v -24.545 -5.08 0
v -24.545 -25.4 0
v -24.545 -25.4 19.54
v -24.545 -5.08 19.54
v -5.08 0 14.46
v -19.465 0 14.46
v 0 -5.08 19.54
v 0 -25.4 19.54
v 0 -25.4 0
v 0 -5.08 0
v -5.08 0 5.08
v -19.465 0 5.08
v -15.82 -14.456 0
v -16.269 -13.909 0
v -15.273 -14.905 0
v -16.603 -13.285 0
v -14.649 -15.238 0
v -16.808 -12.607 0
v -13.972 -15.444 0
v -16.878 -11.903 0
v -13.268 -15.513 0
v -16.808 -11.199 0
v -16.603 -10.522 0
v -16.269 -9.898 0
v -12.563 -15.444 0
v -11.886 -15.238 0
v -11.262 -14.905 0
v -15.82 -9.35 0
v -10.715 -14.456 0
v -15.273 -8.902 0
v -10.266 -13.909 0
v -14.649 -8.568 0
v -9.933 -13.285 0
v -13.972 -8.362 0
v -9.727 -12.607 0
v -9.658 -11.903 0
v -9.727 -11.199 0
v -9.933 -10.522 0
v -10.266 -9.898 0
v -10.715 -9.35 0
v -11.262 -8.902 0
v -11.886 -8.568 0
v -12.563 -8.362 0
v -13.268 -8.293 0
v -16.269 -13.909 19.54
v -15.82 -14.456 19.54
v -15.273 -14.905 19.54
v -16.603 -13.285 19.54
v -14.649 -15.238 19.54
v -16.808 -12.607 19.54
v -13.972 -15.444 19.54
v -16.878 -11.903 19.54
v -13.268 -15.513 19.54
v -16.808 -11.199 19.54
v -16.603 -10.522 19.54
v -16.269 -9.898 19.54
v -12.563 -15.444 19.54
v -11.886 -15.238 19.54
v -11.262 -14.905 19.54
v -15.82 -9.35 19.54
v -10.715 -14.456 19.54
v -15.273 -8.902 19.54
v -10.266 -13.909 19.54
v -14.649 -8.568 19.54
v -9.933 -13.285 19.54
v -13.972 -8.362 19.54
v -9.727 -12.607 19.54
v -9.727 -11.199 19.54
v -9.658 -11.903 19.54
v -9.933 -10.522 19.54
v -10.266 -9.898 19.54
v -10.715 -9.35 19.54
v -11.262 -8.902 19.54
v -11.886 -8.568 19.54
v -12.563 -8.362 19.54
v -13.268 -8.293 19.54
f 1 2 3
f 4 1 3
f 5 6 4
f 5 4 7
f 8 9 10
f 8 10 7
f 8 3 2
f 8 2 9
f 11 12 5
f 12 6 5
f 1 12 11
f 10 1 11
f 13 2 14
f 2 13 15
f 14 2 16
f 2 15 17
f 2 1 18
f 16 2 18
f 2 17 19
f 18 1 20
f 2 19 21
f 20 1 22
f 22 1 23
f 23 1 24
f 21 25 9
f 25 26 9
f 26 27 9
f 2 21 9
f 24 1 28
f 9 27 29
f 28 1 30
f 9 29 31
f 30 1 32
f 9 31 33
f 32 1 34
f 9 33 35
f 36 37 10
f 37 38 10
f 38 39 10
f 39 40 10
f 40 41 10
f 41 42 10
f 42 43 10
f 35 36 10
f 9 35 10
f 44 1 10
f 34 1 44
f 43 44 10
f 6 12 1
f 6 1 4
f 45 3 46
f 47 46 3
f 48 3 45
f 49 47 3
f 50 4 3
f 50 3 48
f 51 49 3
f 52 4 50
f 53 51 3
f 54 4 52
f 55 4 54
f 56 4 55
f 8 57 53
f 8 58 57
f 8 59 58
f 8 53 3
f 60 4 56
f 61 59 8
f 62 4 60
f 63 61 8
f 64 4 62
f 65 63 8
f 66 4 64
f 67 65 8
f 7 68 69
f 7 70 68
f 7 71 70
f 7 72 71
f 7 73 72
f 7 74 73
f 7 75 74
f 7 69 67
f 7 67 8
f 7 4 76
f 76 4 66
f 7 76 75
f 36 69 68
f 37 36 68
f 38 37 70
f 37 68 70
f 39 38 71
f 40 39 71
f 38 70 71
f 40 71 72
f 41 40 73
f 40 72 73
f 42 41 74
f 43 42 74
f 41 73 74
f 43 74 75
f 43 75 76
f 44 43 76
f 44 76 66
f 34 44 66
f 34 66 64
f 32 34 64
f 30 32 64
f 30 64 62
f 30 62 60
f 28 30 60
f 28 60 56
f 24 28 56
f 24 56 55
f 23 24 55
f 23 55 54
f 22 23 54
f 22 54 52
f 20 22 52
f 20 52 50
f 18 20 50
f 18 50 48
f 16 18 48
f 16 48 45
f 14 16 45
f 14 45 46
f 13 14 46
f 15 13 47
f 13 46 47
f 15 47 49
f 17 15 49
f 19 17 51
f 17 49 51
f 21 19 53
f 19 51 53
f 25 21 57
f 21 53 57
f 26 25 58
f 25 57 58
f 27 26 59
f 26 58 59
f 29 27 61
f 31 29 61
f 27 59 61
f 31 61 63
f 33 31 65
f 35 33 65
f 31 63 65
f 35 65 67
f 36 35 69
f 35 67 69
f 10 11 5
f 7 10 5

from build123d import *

# Parameters (mm, degrees)
F0_W     = 24.5453510433
F0_H     = 19.5398386568
F1_DEPTH = 25.4
F2_SIZE  = 5.08
F3_R     = 3.6099939591
F4_DEPTH = 19.5408386568


with BuildPart() as f1:
    # F0 (on Front) → F1 (new body)
    with BuildSketch(Plane.XZ):
        with Locations((-12.2726755217, 9.7699193284)):
            Rectangle(F0_W, F0_H)
    extrude(amount=F1_DEPTH)

    # F2
    f2_edges = [f1.edges().sort_by_distance(p)[0] for p in [
        (-12.272676, 0, 0),
        (0, 0, 9.769919),
        (-12.272676, 0, 19.539839),
        (-24.545351, 0, 9.769919),
    ]]
    chamfer(f2_edges, length=F2_SIZE)

    # F3 (on face) → F4 (cut, through all)
    with BuildSketch(Plane.XY.offset(19.5398386568)):
        with Locations((-13.2677108049, -11.9031285867)):
            Circle(F3_R)
    extrude(amount=-F4_DEPTH, mode=Mode.SUBTRACT)


solid = f1.part
